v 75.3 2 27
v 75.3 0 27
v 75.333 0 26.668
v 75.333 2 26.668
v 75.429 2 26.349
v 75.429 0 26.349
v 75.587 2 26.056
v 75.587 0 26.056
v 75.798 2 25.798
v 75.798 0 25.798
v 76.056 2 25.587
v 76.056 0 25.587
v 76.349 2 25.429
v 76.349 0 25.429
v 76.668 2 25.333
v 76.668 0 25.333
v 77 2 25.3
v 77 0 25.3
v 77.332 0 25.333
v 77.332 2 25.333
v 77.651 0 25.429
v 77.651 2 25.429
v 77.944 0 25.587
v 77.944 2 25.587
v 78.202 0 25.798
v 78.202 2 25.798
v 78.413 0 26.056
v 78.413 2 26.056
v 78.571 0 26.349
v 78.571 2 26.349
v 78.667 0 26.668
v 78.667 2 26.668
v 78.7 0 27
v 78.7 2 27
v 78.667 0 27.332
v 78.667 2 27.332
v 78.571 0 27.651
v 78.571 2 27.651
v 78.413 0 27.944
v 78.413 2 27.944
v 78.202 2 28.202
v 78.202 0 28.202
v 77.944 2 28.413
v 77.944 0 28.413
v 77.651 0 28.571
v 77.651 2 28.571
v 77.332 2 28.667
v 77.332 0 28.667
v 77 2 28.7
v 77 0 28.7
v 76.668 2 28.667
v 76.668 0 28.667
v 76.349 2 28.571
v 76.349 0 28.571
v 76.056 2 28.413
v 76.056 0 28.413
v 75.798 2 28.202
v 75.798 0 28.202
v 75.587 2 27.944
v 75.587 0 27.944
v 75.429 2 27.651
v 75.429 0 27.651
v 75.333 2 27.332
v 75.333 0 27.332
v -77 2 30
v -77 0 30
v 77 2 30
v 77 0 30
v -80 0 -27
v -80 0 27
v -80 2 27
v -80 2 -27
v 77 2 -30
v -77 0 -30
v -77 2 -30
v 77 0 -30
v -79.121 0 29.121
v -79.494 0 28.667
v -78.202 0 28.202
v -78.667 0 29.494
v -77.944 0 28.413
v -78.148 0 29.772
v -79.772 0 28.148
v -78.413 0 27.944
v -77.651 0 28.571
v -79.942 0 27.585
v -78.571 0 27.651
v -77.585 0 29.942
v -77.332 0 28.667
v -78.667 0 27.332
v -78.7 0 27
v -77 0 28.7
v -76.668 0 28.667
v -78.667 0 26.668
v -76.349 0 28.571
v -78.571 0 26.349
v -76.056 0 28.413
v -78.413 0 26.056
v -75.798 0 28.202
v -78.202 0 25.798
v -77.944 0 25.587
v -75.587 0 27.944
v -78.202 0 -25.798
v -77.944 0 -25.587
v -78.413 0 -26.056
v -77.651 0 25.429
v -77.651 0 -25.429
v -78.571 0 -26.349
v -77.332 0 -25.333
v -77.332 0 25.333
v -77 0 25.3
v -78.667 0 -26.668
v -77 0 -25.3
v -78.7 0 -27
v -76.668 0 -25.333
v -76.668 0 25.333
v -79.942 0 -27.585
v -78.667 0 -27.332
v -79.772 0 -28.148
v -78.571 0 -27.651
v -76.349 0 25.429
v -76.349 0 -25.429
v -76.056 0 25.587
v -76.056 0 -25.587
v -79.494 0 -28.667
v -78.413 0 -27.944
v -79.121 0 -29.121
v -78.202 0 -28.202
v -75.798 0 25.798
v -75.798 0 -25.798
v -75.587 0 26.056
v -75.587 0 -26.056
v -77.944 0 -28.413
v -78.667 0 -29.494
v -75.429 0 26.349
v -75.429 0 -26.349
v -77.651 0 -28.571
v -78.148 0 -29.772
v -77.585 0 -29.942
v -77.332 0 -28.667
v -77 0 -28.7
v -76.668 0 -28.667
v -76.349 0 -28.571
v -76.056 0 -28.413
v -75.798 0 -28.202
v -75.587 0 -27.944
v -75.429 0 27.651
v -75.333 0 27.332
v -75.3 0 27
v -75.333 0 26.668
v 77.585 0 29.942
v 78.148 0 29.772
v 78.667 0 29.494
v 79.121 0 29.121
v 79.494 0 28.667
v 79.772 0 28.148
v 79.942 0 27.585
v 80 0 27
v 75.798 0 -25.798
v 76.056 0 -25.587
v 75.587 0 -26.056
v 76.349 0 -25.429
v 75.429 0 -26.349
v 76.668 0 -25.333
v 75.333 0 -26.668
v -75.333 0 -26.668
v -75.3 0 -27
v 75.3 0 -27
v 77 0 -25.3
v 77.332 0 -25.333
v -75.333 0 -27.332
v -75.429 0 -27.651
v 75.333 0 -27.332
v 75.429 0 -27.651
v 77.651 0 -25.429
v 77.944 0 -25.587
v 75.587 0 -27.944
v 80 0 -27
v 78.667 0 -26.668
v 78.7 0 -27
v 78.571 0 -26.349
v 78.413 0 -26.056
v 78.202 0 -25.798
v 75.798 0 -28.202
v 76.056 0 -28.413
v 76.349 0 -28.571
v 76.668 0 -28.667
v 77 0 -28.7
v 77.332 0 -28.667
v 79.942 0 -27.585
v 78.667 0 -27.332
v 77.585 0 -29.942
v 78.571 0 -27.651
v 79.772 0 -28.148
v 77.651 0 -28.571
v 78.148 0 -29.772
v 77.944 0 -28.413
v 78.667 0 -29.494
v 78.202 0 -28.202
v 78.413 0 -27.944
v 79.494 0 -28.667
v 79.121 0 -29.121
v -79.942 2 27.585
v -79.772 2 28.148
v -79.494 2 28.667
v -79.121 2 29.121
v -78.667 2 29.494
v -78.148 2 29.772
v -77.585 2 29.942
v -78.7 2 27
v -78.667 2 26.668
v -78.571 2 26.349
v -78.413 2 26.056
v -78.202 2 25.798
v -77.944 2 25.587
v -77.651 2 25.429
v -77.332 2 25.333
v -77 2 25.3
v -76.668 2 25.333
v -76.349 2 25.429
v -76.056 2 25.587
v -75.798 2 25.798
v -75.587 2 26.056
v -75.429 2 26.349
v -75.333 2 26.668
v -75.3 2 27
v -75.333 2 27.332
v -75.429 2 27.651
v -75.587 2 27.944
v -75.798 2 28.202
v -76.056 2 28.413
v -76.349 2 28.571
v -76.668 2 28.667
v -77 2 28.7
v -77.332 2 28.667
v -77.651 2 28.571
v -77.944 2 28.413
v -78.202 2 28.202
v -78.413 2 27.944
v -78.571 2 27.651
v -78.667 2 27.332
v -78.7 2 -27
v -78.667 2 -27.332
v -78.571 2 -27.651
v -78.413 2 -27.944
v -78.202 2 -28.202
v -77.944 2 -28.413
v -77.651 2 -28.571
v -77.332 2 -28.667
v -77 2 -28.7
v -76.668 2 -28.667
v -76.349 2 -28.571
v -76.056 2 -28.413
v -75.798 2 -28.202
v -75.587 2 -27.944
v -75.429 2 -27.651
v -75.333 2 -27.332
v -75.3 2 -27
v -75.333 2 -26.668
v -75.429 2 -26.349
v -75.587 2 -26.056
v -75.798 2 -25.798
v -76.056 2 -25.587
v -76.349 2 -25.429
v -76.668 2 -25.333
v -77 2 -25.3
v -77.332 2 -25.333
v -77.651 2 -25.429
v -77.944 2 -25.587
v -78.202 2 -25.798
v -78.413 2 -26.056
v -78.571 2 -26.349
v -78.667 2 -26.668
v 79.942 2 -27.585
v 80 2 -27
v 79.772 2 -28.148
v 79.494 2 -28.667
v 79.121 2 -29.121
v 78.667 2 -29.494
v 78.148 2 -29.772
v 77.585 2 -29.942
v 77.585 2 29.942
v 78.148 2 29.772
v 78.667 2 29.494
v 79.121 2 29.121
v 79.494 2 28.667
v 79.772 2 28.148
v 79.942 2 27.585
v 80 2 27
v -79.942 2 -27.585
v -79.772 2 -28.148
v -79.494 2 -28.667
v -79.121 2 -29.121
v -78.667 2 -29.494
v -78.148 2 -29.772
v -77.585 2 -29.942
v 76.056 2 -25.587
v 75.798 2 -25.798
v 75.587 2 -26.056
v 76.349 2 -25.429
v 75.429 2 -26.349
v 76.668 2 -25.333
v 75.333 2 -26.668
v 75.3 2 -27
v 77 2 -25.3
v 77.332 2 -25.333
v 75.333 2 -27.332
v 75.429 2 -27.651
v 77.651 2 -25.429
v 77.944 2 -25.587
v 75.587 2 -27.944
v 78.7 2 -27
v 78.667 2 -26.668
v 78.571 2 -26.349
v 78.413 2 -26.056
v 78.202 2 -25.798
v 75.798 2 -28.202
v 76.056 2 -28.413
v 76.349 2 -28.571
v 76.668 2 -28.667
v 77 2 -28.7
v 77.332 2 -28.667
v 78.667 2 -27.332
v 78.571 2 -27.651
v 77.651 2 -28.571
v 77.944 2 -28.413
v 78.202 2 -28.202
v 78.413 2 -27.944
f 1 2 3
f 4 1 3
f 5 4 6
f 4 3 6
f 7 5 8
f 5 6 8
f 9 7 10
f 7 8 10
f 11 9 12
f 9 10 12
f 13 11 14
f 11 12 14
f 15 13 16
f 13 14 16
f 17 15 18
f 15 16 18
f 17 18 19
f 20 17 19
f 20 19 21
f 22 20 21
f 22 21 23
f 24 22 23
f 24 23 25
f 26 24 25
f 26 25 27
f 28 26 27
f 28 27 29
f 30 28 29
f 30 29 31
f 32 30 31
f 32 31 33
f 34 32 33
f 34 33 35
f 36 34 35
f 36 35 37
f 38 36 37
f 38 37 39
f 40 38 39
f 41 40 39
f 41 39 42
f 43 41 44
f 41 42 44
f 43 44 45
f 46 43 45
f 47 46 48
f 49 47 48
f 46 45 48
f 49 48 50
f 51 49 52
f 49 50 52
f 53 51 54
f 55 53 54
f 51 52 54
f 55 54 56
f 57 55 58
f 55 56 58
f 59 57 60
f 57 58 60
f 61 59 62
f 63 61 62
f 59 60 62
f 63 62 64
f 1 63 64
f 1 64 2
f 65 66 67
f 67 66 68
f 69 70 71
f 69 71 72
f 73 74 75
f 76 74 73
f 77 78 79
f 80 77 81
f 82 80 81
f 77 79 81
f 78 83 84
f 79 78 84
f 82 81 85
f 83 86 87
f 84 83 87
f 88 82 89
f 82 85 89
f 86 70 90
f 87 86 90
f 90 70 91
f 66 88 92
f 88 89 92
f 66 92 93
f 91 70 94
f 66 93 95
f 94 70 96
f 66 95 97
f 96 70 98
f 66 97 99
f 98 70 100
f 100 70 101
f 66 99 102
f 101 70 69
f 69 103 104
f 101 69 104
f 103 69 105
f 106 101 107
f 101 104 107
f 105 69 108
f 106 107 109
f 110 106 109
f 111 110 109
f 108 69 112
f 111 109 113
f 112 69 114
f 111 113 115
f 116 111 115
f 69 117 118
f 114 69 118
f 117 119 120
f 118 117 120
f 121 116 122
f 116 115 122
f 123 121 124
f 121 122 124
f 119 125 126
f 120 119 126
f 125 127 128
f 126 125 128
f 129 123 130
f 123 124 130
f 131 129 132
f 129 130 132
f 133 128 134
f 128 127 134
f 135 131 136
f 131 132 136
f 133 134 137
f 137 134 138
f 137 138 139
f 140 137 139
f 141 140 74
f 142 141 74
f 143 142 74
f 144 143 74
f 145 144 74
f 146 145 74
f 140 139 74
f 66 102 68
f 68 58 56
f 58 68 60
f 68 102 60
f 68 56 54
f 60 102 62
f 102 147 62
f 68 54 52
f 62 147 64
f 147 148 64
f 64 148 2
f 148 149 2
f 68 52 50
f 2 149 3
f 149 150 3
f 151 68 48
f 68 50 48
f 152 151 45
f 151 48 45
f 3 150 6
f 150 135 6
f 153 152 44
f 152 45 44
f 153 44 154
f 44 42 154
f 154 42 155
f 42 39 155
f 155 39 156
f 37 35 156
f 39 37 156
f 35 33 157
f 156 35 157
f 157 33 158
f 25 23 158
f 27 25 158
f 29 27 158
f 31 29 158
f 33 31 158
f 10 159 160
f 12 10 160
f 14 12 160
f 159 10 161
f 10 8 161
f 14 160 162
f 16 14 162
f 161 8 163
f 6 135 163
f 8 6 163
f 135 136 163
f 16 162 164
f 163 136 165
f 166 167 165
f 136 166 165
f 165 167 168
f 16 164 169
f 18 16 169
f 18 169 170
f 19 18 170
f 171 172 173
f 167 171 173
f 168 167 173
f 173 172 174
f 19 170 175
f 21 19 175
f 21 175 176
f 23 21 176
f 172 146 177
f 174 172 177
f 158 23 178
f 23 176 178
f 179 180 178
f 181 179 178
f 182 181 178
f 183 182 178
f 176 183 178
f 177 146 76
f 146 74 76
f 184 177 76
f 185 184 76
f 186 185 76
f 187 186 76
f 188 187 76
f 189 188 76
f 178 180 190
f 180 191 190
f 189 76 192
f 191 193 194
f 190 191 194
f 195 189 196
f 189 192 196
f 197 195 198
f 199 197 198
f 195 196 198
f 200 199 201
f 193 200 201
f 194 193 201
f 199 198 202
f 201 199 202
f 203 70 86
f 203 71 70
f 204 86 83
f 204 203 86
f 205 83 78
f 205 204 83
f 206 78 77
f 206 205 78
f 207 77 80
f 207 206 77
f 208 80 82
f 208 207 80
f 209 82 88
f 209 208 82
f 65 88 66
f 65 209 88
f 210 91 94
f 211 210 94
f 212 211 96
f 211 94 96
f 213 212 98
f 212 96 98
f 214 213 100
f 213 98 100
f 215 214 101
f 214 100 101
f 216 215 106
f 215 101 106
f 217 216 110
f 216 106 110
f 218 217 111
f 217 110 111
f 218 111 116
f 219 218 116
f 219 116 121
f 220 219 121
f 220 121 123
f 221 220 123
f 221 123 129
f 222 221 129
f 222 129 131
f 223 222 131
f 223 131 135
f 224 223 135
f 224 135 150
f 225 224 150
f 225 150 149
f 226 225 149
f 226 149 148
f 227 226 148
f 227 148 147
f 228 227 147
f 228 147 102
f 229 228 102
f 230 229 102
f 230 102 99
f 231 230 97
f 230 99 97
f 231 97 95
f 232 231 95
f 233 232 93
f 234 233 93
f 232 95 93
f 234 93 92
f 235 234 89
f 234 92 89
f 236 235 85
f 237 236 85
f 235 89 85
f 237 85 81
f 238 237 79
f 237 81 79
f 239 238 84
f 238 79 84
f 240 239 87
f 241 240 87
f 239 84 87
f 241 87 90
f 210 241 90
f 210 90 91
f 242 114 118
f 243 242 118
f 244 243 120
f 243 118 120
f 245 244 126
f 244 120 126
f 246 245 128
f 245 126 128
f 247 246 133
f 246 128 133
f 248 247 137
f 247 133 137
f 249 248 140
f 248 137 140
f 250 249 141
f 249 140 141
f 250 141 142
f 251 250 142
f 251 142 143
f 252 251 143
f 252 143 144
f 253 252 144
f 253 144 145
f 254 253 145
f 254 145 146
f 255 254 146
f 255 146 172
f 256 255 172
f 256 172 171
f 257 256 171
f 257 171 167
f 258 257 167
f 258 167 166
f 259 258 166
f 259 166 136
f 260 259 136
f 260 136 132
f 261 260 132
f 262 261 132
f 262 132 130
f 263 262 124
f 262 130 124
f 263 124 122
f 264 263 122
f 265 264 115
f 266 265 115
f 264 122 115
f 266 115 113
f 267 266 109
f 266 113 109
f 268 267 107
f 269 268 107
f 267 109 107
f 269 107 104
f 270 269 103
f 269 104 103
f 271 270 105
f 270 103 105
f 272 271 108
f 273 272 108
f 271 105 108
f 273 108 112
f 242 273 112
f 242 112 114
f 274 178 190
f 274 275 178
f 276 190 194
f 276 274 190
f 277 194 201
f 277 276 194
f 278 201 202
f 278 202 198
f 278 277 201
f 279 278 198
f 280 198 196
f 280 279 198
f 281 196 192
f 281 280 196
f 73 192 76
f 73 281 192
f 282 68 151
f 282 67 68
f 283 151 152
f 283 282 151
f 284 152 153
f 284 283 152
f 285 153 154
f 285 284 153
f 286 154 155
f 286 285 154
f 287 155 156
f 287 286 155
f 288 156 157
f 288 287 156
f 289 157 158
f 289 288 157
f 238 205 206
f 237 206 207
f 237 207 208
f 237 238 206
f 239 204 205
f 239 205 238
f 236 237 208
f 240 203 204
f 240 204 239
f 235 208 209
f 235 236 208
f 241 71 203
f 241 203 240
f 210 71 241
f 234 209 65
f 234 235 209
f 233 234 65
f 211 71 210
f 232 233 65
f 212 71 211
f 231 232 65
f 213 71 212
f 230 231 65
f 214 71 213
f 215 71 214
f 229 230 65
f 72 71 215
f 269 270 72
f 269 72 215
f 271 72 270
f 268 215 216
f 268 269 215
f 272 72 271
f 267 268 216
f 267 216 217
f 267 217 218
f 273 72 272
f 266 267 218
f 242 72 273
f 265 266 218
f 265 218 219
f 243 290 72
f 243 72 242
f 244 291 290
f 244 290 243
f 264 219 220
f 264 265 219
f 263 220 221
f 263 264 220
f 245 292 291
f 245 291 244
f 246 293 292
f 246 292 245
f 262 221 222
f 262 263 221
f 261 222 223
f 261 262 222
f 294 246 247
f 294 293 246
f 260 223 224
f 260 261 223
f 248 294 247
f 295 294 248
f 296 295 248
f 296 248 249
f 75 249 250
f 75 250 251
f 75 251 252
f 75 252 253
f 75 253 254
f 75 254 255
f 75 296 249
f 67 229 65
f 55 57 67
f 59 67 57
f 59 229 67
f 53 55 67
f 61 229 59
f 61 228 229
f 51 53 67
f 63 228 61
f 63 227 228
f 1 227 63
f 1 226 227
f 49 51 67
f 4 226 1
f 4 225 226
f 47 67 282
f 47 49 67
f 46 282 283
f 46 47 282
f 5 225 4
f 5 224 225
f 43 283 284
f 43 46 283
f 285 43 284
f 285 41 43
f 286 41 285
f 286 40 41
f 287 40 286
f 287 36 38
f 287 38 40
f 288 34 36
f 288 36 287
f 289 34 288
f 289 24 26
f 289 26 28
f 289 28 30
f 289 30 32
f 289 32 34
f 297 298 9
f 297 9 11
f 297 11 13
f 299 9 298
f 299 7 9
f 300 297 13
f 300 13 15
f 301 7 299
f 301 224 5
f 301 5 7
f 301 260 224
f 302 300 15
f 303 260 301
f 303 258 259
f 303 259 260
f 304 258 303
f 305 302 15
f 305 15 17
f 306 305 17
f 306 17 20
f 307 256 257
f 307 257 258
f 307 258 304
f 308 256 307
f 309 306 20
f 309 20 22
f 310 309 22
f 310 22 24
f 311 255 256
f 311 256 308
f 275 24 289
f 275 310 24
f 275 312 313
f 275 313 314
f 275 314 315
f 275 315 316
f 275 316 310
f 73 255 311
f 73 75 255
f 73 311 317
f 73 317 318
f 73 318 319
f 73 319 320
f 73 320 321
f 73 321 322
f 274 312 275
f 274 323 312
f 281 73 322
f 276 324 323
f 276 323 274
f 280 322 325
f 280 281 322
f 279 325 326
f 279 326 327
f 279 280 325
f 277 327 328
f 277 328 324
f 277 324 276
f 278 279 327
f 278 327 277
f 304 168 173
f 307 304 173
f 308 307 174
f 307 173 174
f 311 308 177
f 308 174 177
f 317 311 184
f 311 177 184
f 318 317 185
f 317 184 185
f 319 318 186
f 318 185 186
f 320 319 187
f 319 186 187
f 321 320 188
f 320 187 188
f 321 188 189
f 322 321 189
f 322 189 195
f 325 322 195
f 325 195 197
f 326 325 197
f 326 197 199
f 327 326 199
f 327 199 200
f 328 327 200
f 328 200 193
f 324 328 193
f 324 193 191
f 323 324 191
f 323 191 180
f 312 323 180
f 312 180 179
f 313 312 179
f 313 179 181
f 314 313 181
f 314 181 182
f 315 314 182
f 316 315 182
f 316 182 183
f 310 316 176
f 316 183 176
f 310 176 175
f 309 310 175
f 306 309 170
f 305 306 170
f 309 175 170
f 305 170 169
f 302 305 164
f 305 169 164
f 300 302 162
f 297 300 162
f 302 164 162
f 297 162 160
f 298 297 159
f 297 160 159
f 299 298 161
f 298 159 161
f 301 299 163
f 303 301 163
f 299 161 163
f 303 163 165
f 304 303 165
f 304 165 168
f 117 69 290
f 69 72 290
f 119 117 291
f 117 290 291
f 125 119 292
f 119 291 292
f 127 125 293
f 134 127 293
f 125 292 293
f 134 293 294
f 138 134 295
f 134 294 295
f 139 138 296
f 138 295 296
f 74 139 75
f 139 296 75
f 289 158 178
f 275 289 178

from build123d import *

# Parameters (mm, degrees)
SKETCH1_W                = 160
SKETCH1_H                = 60
BOSS_EXTRUDE1_DEPTH      = 2
FILLET1_R                = 3
M3_CLEARANCE_HOLE1_D     = 3.4
M3_CLEARANCE_HOLE1_DEPTH = 10


with BuildPart() as part:
    # Sketch1 → Boss-Extrude1 (new body)
    with BuildSketch(Plane(origin=(0, 0, 0), x_dir=(1, 0, 0), z_dir=(0, 1, 0))):
        Rectangle(SKETCH1_W, SKETCH1_H)
    extrude(amount=BOSS_EXTRUDE1_DEPTH)

    # Fillet1
    fillet1_edges = [part.edges().sort_by_distance(p)[0] for p in [
        (80, 1, 30),
        (-80, 1, 30),
        (-80, 1, -30),
        (80, 1, -30),
    ]]
    fillet(fillet1_edges, radius=FILLET1_R)

    # M3 Clearance Hole1
    with Locations(Plane(origin=(0, 2, 0), x_dir=(1, 0, 0), z_dir=(0, 1, 0))):
        with Locations((-77, 27), (-77, -27), (77, 27), (77, -27)):
            Hole(M3_CLEARANCE_HOLE1_D / 2, depth=M3_CLEARANCE_HOLE1_DEPTH)


solid = part.part
